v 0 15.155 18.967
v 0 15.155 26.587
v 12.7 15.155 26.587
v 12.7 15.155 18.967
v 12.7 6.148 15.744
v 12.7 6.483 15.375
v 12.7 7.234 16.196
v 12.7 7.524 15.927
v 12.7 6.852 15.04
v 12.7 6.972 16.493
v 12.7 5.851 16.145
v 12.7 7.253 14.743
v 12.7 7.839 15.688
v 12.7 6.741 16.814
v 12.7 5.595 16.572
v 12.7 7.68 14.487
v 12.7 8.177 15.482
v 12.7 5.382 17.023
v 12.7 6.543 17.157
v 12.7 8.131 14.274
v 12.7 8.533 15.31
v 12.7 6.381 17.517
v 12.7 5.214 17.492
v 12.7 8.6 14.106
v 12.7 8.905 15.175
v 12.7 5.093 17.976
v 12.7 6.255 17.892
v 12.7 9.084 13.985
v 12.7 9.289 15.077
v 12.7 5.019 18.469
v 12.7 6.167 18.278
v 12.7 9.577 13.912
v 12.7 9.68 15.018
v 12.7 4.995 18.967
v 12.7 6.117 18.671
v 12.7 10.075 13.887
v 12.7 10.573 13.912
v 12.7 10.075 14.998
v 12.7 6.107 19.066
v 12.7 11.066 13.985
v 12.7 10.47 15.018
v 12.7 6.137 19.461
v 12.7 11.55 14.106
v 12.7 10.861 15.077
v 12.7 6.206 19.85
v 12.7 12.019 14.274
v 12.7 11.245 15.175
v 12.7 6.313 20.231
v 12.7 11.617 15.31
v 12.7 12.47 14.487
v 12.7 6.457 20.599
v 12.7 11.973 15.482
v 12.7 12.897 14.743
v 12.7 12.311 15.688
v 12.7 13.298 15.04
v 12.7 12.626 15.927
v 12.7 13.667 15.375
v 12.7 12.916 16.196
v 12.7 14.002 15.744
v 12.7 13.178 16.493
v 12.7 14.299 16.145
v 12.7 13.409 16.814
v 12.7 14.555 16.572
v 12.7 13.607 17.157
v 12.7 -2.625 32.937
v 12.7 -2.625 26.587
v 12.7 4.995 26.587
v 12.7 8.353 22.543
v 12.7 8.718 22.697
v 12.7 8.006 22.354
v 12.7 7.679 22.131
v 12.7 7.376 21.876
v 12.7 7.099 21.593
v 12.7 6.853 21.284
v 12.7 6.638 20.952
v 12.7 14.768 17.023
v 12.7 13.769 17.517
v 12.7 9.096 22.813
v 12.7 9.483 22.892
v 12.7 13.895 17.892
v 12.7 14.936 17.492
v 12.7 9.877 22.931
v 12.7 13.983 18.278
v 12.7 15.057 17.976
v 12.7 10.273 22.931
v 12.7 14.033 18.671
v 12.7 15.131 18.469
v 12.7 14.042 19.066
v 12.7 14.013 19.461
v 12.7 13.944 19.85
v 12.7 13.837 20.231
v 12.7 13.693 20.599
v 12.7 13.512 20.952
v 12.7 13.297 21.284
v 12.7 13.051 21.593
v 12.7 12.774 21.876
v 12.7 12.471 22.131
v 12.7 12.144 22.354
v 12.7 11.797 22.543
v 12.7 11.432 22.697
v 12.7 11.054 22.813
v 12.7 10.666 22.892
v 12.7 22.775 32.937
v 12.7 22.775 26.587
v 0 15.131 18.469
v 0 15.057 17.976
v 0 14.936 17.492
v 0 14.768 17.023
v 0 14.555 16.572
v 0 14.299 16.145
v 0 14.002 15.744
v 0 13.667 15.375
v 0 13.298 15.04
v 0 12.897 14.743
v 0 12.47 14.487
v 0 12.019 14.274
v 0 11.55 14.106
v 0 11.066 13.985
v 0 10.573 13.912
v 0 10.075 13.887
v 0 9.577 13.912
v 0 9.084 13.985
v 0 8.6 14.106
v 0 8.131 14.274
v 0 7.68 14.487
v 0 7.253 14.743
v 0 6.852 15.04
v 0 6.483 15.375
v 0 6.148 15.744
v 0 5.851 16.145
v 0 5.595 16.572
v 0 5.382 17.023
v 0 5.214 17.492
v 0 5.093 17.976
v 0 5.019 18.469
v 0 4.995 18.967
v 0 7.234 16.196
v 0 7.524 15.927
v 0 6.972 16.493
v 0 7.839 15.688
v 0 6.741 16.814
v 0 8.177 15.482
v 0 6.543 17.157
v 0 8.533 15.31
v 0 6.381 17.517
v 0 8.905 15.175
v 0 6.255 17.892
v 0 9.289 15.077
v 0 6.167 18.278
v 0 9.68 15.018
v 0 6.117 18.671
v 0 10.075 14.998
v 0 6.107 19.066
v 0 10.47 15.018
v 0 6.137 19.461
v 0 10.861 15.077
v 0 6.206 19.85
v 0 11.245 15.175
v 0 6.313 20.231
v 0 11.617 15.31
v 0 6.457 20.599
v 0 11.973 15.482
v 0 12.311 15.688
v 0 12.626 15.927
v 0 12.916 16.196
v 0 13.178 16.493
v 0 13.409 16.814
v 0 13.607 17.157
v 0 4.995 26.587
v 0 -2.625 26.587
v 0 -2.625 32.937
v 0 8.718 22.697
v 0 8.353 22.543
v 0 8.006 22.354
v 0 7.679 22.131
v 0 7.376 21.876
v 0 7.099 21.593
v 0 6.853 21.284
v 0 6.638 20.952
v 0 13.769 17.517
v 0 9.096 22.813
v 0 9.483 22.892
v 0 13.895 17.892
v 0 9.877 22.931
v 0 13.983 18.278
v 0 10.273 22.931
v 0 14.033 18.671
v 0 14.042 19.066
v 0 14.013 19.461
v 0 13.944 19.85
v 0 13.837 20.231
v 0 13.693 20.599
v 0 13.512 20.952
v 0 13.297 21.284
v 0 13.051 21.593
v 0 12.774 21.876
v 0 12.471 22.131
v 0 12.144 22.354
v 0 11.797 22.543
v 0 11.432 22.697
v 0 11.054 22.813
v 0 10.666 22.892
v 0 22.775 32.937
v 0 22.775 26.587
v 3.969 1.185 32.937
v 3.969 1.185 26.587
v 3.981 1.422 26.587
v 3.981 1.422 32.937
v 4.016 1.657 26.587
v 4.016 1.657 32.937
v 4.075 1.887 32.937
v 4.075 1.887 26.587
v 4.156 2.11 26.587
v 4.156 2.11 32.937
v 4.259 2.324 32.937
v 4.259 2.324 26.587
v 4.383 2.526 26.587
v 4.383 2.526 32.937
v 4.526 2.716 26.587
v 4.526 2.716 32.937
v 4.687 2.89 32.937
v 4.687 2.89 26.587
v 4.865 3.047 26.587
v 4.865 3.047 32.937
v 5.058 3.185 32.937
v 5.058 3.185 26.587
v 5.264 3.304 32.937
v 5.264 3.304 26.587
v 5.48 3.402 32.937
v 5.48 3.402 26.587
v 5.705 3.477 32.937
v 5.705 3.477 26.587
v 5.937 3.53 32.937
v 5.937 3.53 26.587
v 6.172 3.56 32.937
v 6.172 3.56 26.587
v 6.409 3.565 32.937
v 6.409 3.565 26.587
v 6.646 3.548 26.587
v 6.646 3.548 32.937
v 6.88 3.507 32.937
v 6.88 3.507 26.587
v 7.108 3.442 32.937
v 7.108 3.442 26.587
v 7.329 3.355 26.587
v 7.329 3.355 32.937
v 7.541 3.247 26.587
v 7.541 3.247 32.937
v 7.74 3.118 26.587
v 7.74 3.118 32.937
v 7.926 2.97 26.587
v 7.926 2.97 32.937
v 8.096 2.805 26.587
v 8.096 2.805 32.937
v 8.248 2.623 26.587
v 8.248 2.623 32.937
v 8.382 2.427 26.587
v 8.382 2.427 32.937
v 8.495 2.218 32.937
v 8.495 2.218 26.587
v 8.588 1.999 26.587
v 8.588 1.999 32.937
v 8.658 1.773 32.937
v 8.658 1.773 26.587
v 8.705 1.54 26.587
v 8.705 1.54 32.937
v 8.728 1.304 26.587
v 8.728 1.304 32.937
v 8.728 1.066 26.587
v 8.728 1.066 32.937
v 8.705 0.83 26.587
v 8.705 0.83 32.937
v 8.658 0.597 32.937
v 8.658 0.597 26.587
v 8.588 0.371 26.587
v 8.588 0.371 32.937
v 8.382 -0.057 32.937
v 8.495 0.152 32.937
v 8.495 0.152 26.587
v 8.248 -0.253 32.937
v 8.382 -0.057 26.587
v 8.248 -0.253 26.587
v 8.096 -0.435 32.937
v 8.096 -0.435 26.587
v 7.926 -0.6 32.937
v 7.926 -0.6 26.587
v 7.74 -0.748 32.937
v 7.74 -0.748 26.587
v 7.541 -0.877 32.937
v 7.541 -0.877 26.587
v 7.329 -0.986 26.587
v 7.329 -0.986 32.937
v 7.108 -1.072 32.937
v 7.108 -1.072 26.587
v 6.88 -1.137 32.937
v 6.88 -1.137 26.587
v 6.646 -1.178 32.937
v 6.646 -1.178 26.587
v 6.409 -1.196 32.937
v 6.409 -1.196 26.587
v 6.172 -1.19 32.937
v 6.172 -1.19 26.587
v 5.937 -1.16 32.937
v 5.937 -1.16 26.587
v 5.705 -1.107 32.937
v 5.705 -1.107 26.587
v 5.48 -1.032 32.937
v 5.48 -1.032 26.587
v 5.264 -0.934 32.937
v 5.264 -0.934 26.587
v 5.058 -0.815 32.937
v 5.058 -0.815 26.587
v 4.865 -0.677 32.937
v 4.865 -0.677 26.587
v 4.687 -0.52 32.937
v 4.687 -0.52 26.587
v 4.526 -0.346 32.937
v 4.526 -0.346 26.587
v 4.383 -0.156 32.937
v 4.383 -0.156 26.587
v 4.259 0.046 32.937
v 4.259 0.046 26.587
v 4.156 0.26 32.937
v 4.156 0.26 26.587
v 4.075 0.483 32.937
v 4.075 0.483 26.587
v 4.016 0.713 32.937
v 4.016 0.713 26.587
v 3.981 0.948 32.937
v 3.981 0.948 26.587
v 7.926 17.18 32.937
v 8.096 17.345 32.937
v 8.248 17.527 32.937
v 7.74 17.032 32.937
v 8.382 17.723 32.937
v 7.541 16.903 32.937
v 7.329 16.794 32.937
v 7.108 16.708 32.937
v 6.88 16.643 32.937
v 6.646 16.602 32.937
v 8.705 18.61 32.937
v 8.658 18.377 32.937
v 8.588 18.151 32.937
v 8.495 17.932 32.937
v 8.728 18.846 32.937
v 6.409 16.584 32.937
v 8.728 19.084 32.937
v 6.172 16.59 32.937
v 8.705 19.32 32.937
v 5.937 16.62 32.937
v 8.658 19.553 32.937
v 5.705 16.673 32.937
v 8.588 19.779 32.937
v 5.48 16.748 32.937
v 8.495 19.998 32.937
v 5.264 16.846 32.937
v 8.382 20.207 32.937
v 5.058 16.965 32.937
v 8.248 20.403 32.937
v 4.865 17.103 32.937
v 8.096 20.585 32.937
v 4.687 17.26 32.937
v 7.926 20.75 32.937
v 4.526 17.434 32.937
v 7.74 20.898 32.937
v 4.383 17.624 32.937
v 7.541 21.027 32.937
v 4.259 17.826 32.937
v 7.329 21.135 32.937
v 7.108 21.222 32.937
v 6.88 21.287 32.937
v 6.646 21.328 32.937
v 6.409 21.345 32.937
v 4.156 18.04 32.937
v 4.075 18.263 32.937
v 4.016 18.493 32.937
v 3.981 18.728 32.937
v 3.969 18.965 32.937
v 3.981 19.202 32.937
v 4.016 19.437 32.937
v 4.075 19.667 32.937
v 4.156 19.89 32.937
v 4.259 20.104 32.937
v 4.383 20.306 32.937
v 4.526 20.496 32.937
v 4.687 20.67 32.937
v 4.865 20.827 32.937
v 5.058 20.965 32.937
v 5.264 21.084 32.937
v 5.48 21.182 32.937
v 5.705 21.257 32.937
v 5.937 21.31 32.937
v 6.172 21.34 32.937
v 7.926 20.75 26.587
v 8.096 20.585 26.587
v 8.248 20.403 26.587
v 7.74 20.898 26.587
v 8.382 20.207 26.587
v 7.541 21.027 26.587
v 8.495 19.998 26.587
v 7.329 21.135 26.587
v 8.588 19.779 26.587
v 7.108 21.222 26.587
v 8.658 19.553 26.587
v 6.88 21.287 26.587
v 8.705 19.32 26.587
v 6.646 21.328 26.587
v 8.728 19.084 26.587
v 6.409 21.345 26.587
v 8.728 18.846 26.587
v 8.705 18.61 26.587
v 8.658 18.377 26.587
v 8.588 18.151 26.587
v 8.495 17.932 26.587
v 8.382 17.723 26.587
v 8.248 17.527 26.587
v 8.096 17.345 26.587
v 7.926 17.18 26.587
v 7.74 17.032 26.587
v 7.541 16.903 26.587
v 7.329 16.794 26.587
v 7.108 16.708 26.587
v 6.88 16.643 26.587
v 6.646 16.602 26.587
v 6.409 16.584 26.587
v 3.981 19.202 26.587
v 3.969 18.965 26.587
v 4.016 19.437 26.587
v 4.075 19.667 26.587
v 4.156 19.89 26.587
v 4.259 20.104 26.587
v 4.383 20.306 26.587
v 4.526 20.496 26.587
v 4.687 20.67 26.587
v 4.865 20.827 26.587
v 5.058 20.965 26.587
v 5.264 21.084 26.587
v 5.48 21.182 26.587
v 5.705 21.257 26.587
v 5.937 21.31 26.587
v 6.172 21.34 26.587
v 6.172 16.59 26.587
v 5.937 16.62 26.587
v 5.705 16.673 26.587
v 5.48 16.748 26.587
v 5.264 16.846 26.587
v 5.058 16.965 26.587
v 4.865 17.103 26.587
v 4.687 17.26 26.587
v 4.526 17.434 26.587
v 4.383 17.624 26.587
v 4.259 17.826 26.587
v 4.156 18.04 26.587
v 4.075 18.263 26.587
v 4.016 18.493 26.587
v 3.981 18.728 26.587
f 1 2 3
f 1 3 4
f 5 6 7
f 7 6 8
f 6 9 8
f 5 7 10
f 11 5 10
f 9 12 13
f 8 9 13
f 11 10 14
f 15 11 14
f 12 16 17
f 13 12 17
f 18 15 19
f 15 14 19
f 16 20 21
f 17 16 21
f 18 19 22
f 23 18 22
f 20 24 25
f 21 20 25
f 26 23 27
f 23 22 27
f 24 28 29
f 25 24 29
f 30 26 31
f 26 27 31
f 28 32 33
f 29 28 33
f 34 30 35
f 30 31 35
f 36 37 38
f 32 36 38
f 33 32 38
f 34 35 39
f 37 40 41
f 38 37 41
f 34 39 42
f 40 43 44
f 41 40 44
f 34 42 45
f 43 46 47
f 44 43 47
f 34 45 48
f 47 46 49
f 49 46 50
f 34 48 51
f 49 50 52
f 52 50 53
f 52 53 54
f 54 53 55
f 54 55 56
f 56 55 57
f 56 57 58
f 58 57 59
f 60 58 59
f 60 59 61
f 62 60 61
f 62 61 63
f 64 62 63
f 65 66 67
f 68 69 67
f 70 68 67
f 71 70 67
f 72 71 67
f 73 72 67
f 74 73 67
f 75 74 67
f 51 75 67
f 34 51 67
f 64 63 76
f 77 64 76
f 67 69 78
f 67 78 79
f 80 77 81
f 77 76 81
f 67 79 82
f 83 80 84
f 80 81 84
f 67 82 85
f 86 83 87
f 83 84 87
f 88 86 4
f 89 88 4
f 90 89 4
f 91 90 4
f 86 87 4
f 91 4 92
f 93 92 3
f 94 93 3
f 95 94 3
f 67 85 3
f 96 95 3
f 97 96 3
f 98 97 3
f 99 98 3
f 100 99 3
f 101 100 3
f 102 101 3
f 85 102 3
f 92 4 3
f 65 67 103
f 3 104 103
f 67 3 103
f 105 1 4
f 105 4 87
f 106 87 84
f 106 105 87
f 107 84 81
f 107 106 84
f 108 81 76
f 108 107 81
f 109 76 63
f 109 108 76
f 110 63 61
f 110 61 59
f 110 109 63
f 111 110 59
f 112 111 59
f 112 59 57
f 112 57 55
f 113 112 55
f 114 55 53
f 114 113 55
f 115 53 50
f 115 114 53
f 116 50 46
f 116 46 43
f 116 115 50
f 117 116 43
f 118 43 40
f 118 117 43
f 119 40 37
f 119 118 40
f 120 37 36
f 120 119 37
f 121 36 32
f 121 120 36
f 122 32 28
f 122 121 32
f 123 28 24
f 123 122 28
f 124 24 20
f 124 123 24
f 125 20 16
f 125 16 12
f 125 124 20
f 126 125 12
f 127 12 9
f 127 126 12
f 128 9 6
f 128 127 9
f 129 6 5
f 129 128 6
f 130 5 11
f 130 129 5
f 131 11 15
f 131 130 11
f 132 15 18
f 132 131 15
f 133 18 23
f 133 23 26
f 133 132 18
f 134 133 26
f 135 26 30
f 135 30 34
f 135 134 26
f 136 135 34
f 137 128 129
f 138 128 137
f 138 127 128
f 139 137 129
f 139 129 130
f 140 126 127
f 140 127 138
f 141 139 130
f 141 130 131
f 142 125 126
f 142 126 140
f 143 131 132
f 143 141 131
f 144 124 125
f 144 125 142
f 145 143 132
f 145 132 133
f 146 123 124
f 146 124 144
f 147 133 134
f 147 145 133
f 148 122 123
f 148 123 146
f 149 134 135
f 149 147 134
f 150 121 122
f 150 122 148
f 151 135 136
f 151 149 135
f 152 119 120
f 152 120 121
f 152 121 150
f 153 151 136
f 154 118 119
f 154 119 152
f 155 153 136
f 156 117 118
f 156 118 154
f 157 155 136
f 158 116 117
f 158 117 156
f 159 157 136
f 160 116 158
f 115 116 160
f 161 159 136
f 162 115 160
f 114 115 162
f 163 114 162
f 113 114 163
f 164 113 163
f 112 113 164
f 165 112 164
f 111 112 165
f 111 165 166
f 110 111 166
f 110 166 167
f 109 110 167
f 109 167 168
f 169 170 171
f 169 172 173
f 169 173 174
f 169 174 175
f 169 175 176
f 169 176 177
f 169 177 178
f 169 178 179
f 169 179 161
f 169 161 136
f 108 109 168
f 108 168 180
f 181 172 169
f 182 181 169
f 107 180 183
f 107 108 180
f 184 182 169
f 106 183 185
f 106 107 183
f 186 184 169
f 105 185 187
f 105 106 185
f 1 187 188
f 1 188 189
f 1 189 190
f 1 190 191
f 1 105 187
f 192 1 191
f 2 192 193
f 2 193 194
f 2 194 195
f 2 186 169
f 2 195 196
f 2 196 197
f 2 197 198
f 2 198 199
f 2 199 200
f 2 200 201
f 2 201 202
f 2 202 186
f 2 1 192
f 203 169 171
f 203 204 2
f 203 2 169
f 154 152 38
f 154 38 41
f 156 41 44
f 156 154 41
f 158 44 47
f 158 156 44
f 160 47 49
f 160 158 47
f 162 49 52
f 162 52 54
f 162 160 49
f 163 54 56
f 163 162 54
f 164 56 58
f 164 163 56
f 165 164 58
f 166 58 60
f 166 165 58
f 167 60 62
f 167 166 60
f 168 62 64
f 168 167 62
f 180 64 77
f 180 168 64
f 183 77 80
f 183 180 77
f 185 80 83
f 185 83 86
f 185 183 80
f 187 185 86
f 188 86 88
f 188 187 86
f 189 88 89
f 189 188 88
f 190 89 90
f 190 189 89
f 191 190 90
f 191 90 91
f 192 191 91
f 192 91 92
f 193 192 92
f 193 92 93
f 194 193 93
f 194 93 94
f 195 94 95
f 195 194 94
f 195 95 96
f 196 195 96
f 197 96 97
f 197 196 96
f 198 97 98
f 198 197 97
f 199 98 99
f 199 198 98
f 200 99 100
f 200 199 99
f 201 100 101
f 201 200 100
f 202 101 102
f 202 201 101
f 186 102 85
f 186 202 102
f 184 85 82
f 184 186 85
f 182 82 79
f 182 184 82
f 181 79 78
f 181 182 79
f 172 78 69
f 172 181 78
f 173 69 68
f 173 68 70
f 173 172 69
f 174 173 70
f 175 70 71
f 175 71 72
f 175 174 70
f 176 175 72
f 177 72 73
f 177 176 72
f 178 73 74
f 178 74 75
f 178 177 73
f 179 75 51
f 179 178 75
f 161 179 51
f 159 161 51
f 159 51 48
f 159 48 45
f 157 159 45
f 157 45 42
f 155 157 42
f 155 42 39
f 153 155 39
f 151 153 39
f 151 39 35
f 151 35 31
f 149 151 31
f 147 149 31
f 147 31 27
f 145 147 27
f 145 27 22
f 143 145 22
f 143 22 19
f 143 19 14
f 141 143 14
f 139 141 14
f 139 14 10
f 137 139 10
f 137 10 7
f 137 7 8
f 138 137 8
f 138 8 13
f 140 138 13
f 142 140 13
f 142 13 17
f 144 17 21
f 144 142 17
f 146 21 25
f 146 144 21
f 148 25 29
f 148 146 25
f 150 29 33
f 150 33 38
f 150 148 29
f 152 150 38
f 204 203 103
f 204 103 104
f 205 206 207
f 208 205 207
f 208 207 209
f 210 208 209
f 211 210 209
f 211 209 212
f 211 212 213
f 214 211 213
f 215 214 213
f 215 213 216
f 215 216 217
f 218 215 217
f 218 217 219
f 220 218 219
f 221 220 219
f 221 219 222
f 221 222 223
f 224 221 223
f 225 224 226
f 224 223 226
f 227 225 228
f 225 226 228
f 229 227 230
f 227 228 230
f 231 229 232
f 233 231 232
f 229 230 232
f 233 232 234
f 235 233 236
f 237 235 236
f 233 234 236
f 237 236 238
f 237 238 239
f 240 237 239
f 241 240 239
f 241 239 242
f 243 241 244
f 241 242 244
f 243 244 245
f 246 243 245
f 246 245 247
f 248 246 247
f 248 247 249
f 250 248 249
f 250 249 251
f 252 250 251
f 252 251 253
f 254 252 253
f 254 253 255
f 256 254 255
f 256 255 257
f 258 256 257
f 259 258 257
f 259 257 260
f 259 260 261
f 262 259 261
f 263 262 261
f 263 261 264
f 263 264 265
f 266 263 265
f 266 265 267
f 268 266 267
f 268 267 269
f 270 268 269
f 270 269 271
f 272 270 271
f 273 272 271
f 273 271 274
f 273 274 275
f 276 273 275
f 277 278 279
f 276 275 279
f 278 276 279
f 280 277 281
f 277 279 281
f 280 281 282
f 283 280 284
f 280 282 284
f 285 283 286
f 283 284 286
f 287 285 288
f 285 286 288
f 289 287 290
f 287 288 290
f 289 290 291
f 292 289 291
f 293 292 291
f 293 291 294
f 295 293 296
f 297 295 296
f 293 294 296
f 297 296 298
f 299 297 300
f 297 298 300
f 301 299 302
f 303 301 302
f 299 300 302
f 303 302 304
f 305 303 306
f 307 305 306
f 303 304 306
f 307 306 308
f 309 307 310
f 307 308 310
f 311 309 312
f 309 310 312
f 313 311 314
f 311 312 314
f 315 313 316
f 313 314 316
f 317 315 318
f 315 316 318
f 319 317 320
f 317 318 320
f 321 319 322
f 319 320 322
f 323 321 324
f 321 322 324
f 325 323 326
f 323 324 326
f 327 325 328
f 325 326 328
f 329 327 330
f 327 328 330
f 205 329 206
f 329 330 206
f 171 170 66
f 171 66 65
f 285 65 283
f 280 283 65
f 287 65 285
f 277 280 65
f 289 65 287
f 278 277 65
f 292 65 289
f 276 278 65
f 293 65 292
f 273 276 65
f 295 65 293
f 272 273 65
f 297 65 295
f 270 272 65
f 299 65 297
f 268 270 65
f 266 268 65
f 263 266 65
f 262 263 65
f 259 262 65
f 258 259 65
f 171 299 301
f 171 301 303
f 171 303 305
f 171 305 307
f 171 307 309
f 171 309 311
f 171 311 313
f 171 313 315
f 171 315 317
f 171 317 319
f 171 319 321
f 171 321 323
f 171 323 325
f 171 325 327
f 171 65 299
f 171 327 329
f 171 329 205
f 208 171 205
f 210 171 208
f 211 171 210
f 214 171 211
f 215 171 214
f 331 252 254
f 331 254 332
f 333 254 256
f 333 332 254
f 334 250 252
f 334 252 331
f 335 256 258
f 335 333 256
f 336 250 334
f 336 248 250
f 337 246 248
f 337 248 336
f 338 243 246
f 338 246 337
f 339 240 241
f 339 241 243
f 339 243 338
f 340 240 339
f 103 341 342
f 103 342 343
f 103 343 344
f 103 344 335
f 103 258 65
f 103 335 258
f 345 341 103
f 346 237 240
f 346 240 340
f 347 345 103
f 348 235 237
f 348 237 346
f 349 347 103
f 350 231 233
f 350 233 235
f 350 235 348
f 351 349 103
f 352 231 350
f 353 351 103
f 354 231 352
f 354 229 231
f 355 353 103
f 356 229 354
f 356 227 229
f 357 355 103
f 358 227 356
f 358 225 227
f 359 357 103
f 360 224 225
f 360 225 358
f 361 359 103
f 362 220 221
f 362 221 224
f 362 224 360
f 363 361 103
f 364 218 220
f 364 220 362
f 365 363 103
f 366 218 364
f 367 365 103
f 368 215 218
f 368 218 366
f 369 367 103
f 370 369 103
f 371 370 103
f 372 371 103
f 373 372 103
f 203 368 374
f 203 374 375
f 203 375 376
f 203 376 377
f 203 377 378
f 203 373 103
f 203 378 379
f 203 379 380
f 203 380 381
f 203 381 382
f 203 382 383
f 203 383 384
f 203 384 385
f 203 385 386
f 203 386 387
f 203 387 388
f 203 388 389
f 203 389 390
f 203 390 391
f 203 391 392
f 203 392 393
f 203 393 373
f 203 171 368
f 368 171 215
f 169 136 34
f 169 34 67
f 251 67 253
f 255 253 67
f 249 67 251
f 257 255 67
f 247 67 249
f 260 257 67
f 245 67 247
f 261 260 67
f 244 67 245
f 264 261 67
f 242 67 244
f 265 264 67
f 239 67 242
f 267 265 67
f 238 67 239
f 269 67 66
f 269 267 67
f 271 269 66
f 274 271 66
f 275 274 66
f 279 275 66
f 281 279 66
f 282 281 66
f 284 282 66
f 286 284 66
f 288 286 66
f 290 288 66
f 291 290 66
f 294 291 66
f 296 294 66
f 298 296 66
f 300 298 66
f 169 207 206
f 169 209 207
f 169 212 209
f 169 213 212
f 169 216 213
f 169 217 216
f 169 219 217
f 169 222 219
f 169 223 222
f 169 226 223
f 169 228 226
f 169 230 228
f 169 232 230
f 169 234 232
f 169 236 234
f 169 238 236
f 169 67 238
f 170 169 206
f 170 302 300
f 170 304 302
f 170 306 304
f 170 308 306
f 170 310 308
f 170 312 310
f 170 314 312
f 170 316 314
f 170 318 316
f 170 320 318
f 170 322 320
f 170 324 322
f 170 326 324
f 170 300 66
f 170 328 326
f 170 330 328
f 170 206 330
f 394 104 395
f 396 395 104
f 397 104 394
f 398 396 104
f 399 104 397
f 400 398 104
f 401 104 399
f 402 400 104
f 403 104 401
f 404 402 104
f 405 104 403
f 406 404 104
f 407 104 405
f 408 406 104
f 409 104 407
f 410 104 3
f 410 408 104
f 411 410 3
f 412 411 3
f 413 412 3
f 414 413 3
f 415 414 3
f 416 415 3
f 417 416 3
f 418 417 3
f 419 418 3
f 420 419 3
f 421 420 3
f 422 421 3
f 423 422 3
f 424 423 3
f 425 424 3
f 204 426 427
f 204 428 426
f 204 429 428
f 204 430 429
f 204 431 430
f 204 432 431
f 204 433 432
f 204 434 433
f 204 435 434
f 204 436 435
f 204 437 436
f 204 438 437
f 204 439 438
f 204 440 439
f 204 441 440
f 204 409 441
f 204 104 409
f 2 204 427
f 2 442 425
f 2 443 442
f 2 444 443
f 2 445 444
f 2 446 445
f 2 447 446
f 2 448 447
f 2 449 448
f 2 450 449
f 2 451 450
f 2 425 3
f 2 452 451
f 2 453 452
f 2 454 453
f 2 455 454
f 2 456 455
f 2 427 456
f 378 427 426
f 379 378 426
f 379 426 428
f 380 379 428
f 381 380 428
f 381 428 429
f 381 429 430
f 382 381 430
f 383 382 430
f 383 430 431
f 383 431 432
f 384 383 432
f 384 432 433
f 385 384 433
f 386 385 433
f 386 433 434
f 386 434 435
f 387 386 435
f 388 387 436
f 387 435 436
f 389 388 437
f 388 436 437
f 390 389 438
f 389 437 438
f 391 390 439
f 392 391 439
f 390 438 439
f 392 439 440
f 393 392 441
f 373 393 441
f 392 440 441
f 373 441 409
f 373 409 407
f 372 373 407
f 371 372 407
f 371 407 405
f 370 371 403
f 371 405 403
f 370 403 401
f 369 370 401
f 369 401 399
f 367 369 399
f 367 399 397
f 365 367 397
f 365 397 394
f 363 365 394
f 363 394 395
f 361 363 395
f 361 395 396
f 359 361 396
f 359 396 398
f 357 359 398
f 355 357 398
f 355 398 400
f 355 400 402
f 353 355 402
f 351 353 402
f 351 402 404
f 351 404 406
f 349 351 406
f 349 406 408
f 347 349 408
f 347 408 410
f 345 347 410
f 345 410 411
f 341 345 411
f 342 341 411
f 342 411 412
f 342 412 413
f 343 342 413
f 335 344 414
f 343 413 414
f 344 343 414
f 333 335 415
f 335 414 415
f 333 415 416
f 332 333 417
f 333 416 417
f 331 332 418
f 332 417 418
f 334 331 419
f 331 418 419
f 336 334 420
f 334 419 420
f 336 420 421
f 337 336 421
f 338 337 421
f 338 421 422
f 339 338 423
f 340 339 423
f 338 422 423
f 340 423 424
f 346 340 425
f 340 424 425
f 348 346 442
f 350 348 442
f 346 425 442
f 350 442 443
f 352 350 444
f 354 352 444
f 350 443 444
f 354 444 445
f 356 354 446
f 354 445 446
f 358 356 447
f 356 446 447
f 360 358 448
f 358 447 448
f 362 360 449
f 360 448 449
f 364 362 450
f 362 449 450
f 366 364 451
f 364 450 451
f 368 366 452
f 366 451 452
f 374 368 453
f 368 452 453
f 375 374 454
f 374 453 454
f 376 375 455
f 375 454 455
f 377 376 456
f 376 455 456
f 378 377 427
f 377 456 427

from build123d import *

# Parameters (mm, degrees)
SKETCH1_R           = 3.96875
BOSS_EXTRUDE1_DEPTH = 12.7
SKETCH2_R           = 2.38125
CUT_EXTRUDE1_DEPTH  = 7.35


with BuildPart() as part:
    # Sketch1 → Boss-Extrude1 (new body)
    with BuildSketch(Plane(origin=(0, 0, 0), x_dir=(0, 0, -1), z_dir=(1, 0, 0))):
        with BuildLine():
            Line((-26.587134527, 4.994963407), (-26.587134527, -2.625036593))
            Line((-26.587134527, -2.625036593), (-32.937134527, -2.625036593))
            Line((-32.937134527, -2.625036593), (-32.937134527, 22.774963407))
            Line((-32.937134527, 22.774963407), (-26.587134527, 22.774963407))
            Line((-26.587134527, 22.774963407), (-26.587134527, 15.154963407))
            Line((-26.587134527, 15.154963407), (-18.967134527, 15.154963407))
            ThreePointArc((-18.967134527, 15.154963407), (-13.887134527, 10.074963407), (-18.967134527, 4.994963407))
            Line((-18.967134527, 4.994963407), (-26.587134527, 4.994963407))
        make_face()
        with Locations((-18.967134527, 10.074963407)):
            Circle(SKETCH1_R, mode=Mode.SUBTRACT)
    extrude(amount=BOSS_EXTRUDE1_DEPTH)

    # Sketch2 → Cut-Extrude1 (cut, through all)
    with BuildSketch(Plane(origin=(0, 0, 26.587134527), x_dir=(-1, 0, 0), z_dir=(0, 0, -1))):
        with Locations((-6.35, 18.964963407)):
            Circle(SKETCH2_R)
        with Locations((-6.35, 1.184963407)):
            Circle(SKETCH2_R)
    extrude(amount=-CUT_EXTRUDE1_DEPTH, mode=Mode.SUBTRACT)


solid = part.part
